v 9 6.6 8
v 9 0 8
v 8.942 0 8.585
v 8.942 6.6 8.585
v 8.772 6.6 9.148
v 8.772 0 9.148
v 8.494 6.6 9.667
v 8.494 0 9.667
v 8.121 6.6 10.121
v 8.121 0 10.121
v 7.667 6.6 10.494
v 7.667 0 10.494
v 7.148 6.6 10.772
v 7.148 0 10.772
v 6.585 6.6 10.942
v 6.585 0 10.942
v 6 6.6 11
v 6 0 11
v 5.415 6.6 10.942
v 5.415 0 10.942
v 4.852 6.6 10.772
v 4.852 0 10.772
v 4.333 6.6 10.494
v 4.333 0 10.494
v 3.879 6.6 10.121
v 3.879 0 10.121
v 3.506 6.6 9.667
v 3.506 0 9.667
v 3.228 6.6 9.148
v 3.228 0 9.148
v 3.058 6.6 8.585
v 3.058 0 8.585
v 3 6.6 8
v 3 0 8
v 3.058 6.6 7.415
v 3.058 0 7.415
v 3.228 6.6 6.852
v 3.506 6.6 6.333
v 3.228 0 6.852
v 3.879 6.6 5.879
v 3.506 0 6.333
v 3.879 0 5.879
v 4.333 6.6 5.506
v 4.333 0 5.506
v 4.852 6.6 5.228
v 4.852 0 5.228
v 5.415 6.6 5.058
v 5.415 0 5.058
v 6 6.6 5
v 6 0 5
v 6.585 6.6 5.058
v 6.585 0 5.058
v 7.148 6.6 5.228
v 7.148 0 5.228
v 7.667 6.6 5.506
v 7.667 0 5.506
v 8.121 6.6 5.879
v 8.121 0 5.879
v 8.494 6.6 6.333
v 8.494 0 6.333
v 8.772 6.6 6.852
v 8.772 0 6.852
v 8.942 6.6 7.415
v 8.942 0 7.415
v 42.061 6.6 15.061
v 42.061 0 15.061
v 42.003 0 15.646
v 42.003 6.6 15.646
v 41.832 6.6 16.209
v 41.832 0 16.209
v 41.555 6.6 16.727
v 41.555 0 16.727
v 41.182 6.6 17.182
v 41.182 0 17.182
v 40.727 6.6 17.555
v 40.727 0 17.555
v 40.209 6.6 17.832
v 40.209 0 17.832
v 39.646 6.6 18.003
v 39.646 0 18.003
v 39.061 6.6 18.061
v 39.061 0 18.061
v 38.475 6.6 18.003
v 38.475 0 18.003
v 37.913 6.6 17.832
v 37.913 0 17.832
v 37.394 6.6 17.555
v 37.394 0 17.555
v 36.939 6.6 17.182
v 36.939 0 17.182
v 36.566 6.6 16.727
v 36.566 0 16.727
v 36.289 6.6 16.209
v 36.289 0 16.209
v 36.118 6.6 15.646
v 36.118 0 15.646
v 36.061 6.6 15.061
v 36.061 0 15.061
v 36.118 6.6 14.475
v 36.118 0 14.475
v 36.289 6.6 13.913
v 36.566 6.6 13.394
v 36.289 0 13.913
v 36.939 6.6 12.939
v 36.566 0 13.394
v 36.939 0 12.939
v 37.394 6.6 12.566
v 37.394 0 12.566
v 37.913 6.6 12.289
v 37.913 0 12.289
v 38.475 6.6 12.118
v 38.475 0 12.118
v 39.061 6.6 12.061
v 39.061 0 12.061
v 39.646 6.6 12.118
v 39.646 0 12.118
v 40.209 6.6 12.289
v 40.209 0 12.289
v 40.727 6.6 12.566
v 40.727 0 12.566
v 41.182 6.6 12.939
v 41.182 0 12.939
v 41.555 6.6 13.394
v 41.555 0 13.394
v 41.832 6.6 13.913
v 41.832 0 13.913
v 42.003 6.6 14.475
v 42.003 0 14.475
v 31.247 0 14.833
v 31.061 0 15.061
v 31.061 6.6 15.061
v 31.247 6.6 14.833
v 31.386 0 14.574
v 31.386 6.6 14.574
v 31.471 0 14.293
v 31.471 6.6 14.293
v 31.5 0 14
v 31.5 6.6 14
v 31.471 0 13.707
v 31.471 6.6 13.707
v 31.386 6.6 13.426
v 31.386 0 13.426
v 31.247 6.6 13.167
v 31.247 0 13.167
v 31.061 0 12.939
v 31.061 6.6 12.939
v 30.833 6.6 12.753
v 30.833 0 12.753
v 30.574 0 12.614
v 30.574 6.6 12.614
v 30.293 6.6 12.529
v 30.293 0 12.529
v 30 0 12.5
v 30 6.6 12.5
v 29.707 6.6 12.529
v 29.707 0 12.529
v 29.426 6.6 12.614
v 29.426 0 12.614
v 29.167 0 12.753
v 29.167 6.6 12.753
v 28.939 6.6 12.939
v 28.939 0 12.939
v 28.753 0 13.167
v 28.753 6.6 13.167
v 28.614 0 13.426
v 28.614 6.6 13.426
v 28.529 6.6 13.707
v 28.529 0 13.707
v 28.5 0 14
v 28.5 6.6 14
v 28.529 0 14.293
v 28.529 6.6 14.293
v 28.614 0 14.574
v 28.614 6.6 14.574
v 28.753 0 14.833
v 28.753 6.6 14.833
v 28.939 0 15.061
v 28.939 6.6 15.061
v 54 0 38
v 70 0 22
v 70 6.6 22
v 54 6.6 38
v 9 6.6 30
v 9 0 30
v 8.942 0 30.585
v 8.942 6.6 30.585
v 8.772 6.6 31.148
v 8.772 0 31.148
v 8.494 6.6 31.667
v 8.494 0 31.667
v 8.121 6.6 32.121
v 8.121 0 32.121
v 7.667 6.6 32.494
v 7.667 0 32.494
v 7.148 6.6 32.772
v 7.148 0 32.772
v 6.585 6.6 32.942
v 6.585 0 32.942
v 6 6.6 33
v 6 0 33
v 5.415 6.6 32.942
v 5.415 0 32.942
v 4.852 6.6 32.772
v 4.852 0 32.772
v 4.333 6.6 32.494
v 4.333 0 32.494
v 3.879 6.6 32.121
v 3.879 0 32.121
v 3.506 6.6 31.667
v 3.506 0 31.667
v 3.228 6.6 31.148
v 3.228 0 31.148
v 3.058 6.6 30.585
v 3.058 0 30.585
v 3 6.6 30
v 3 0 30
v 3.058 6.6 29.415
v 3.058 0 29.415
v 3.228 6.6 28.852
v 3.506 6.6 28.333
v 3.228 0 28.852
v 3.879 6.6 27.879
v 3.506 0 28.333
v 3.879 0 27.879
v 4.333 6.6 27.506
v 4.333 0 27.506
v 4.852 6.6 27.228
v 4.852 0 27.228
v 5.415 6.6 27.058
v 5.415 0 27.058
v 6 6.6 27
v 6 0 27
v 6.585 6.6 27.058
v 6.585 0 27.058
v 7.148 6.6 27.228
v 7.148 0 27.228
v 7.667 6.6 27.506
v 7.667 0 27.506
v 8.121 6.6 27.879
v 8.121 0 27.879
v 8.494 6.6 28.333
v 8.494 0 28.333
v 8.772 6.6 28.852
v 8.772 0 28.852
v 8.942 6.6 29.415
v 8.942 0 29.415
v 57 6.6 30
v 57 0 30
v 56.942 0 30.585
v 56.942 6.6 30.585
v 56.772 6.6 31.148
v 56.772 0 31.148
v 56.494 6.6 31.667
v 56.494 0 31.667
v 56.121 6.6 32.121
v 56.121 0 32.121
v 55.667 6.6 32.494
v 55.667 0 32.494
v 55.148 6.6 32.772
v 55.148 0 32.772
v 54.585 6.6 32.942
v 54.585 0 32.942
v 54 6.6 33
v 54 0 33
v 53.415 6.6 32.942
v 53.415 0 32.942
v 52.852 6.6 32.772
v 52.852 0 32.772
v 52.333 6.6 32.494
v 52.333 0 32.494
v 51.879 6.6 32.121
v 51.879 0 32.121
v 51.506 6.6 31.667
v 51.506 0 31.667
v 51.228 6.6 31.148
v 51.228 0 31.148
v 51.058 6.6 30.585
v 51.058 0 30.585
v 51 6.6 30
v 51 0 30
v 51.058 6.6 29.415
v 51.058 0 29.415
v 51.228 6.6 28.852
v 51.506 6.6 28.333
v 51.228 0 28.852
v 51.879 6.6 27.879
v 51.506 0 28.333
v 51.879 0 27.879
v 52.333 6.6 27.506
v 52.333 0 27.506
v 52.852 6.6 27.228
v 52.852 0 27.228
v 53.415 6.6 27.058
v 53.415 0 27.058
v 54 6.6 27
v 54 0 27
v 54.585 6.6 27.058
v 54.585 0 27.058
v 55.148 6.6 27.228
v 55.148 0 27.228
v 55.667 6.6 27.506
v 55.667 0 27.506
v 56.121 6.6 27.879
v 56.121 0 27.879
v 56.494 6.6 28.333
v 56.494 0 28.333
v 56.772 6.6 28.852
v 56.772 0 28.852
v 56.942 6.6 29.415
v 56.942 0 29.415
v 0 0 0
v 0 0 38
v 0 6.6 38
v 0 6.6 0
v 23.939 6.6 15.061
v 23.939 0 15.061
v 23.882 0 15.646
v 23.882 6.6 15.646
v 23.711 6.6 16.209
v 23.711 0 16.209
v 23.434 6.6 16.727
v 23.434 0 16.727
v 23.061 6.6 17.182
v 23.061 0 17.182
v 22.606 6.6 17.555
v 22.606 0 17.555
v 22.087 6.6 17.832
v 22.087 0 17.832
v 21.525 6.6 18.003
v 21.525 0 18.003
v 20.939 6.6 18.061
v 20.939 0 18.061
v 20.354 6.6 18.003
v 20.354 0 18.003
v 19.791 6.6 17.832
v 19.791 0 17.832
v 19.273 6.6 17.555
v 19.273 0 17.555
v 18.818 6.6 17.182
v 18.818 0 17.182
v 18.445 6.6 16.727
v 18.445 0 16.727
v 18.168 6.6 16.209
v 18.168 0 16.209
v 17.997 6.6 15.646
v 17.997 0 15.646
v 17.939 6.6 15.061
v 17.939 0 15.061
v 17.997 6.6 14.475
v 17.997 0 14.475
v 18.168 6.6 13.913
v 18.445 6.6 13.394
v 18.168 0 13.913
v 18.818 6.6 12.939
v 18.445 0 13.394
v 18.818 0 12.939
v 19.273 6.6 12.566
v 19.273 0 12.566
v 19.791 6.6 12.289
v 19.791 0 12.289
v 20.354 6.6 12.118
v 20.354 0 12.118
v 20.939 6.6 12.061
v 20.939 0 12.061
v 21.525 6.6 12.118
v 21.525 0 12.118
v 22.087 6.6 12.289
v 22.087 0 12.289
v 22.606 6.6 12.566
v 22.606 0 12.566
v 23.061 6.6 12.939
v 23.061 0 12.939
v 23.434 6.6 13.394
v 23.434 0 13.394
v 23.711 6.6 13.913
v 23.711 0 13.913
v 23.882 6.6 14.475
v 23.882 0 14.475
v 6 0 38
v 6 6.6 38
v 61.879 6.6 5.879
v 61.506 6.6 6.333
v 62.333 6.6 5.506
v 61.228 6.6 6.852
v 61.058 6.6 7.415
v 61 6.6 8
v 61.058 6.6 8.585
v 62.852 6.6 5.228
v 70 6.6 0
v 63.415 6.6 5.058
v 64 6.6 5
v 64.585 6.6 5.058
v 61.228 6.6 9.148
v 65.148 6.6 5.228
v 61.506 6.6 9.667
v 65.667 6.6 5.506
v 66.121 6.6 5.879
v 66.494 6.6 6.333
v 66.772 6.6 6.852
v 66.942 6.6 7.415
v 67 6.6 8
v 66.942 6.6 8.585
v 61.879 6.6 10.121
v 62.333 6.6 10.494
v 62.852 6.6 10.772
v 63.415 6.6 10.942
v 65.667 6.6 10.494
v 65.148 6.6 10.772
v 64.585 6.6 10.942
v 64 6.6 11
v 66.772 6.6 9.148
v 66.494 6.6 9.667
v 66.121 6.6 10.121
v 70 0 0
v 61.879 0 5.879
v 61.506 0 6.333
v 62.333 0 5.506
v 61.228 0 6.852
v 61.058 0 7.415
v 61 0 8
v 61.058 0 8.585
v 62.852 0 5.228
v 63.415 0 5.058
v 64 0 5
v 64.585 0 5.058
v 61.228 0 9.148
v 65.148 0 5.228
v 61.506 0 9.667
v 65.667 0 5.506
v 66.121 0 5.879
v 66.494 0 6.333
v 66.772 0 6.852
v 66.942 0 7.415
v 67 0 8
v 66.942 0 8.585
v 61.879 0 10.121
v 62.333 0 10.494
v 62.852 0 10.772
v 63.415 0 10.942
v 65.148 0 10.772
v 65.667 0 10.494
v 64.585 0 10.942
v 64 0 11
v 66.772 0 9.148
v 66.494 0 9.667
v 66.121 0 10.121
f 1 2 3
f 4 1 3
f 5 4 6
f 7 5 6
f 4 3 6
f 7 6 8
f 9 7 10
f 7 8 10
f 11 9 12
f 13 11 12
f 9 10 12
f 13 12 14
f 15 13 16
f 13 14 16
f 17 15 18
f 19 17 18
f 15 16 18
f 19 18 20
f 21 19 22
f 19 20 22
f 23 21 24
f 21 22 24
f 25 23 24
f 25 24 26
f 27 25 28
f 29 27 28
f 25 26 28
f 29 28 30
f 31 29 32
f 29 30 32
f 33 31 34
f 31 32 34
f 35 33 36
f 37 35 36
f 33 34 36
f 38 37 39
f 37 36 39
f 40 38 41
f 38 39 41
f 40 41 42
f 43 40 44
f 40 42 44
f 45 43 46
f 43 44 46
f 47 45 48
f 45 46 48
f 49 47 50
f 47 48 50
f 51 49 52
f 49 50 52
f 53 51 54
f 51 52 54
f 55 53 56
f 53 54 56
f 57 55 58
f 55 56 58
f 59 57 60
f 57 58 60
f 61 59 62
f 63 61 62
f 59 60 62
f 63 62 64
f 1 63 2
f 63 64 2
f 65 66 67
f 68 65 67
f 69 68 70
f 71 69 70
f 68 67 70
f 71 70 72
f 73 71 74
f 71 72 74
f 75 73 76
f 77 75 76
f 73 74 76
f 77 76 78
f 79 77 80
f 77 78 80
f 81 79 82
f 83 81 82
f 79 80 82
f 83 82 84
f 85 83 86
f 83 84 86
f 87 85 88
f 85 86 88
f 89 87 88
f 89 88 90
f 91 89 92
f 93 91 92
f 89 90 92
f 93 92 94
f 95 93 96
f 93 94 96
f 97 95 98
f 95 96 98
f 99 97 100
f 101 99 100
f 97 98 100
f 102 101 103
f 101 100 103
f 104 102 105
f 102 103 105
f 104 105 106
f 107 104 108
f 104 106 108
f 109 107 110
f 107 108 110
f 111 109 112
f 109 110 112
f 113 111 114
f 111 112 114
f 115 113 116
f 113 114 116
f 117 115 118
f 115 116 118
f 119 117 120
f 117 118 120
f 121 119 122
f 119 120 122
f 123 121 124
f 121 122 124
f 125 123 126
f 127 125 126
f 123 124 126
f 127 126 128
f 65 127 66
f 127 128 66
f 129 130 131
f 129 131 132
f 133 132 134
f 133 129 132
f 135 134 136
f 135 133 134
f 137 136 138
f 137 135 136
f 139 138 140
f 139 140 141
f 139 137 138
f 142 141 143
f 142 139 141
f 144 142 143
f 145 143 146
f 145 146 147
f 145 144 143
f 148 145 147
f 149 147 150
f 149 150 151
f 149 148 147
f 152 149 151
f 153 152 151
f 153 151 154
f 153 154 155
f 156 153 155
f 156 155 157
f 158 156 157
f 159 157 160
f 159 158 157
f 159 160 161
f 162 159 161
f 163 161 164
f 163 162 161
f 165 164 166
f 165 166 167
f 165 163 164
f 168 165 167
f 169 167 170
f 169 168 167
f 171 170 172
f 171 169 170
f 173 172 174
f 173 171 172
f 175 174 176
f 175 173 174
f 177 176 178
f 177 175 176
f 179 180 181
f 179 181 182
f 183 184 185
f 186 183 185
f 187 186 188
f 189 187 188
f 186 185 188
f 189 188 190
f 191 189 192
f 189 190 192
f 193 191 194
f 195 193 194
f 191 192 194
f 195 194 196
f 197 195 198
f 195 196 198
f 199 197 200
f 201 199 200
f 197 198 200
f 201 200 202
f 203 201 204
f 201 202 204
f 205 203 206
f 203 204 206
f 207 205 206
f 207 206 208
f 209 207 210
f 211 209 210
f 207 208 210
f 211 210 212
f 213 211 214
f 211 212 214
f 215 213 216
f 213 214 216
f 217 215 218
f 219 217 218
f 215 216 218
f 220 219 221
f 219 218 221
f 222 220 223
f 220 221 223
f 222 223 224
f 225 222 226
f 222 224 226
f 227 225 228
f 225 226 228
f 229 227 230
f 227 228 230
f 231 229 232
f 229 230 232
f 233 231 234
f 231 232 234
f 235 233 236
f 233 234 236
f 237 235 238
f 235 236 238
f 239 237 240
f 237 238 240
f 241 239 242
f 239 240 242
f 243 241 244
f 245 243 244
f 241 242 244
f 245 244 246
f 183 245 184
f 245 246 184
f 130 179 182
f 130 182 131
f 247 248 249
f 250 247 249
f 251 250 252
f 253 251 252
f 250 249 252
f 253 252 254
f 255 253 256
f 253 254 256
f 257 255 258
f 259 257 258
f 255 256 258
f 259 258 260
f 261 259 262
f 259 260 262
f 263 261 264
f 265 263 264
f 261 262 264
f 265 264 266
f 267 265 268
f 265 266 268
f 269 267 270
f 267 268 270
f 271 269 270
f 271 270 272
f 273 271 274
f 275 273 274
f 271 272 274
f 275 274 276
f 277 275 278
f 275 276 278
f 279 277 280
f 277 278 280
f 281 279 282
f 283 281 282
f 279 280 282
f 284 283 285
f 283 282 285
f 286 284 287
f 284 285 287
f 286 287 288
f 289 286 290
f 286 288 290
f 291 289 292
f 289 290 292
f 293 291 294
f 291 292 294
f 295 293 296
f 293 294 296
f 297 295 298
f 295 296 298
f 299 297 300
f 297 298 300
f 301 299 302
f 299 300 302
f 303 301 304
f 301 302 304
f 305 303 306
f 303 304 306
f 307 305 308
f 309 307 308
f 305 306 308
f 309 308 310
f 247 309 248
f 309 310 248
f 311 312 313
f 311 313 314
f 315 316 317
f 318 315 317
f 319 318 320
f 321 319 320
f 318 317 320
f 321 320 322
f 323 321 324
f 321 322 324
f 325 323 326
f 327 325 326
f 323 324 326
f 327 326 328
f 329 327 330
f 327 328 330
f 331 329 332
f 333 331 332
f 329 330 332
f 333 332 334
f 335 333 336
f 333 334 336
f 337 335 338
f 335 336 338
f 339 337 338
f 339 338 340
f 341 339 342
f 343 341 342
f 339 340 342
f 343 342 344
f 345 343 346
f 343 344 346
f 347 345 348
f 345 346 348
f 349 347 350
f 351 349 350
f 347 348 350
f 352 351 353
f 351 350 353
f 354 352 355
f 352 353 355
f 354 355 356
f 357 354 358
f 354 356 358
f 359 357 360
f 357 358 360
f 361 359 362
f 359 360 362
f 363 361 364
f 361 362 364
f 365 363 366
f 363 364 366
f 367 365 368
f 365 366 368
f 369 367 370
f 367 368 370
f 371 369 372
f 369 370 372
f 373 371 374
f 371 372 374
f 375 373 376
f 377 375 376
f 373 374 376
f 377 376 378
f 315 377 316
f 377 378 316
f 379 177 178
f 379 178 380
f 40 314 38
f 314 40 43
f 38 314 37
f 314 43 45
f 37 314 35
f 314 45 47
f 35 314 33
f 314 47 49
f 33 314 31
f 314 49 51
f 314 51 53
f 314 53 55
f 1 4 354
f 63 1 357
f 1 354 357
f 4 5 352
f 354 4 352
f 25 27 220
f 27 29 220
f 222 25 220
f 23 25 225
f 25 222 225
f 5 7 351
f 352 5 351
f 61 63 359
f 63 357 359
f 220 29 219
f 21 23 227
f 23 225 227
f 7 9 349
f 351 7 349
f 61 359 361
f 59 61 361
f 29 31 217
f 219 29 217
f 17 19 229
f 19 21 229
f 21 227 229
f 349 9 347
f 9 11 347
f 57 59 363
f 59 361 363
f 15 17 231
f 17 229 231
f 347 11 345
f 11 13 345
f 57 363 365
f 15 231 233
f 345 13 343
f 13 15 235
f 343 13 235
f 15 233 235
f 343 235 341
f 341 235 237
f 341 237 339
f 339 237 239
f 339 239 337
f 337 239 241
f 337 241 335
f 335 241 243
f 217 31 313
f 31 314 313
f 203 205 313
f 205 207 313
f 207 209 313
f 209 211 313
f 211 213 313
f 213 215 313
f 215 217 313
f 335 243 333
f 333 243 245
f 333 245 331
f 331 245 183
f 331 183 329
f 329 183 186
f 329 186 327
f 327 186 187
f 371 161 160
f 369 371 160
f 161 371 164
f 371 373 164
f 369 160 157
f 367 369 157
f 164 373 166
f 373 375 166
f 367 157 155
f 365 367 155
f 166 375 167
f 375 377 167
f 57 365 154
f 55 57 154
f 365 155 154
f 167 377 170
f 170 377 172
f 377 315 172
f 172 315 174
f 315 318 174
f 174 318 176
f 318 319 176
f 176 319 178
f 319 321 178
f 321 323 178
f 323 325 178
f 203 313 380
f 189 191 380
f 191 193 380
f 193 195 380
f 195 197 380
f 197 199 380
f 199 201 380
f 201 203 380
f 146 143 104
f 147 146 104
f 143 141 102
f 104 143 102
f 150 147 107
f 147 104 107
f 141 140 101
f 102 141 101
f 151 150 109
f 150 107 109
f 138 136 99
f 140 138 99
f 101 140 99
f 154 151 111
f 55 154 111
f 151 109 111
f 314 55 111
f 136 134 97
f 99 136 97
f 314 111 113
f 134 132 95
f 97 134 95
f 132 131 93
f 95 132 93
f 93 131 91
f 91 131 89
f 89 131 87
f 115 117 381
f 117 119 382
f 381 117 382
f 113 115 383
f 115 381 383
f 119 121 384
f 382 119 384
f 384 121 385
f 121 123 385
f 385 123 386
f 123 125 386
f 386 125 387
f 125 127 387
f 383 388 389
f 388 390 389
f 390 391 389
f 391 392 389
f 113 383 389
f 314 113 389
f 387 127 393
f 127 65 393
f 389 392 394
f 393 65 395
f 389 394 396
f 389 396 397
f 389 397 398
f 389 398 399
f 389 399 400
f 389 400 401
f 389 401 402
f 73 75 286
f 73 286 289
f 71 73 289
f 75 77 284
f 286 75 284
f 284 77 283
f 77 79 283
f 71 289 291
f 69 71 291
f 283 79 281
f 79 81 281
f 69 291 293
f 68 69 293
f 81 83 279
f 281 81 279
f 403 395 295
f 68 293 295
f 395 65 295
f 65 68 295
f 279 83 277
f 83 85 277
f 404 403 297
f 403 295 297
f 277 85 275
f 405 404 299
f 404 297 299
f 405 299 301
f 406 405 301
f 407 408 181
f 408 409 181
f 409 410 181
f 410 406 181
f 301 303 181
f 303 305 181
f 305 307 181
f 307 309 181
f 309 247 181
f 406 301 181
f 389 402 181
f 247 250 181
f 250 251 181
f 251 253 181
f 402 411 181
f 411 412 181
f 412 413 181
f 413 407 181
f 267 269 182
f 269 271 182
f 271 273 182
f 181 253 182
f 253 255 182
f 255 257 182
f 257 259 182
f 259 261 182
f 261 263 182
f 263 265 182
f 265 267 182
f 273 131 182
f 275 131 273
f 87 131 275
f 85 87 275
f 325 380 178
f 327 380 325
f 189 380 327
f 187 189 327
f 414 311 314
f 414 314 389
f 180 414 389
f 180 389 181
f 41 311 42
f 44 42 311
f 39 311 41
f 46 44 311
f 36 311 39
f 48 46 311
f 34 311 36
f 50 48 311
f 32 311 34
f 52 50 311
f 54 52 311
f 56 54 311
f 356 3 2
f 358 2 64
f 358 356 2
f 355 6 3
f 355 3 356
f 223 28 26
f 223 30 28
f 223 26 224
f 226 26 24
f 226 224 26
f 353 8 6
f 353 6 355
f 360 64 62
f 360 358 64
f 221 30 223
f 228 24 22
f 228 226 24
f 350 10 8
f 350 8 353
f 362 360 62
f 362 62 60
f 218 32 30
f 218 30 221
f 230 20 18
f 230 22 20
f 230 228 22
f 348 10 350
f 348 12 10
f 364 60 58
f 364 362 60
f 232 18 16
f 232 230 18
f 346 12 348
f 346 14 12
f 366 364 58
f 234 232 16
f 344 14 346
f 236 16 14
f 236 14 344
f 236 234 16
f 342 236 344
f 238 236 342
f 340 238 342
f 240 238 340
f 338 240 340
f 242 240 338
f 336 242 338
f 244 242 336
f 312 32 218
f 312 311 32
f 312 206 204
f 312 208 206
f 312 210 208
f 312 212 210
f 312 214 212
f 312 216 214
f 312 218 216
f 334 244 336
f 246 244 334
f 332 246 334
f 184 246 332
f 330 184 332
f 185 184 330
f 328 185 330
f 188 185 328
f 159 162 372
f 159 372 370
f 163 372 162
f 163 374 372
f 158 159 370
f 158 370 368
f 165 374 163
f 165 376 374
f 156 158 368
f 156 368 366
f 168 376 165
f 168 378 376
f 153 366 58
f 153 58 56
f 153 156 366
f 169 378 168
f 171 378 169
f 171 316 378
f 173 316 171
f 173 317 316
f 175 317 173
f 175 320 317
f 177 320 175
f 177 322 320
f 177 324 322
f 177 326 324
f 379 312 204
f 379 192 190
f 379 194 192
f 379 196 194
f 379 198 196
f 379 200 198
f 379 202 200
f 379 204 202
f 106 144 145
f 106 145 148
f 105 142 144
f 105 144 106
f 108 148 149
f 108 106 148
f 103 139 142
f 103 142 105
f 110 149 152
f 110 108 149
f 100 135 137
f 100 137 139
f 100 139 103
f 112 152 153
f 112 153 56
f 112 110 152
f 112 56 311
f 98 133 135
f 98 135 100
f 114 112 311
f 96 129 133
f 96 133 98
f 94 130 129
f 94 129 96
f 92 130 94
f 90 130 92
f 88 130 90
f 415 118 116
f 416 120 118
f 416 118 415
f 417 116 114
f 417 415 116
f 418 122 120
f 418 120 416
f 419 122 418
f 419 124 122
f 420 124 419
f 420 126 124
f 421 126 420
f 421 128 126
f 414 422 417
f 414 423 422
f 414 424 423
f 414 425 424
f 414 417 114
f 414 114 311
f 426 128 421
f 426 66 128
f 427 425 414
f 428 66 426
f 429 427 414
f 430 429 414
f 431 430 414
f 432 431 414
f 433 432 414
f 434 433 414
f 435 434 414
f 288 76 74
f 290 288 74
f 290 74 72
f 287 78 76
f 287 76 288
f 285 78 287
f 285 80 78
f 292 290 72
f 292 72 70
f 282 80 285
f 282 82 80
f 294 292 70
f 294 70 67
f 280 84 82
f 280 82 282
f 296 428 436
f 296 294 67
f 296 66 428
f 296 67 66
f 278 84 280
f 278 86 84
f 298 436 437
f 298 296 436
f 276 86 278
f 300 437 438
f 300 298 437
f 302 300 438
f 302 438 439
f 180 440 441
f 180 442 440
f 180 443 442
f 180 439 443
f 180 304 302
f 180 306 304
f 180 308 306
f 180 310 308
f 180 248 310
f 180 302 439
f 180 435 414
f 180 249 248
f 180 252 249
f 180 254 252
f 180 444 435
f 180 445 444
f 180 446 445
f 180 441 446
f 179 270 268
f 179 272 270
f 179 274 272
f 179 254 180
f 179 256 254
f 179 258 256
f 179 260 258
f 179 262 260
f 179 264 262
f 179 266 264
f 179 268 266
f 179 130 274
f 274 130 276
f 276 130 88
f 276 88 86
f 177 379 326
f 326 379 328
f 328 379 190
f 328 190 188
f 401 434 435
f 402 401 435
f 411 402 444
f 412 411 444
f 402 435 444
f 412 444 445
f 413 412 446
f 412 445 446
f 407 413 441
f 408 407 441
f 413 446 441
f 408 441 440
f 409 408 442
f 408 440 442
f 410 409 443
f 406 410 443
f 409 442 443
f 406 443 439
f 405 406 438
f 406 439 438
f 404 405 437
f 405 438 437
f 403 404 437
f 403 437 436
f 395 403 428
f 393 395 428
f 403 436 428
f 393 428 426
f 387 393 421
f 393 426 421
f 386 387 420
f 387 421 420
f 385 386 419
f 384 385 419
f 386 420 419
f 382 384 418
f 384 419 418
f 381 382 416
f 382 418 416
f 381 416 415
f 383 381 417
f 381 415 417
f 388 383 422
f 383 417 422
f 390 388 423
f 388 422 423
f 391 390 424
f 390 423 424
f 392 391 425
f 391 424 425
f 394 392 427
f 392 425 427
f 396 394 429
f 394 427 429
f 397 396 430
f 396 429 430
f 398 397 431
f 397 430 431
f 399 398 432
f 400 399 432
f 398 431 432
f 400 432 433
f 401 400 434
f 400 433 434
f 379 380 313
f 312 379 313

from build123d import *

# Parameters (mm, degrees)
F0_R     = 3
F1_DEPTH = 6.6


with BuildPart() as f1:
    # F0 (on Front) → F1 (new body)
    with BuildSketch(Plane.XZ):
        with BuildLine():
            Line((0, 38), (0, 0))
            Line((0, 0), (70, 0))
            Line((70, 0), (70, 21.999999))
            Line((70, 21.999999), (54, 38))
            Line((54, 38), (31.060658, 15.06066))
            ThreePointArc((31.060658, 15.06066), (29.999998, 12.5), (28.939338, 15.06066))
            Line((28.939338, 15.06066), (6, 38))
            Line((6, 38), (0, 38))
        make_face()
        with Locations((6, 8)):
            Circle(F0_R, mode=Mode.SUBTRACT)
        with Locations((20.939338, 15.060661)):
            Circle(F0_R, mode=Mode.SUBTRACT)
        with Locations((64, 8)):
            Circle(F0_R, mode=Mode.SUBTRACT)
        with Locations((39.060658, 15.060661)):
            Circle(F0_R, mode=Mode.SUBTRACT)
        with Locations((6, 30)):
            Circle(F0_R, mode=Mode.SUBTRACT)
        with Locations((53.999996, 30)):
            Circle(F0_R, mode=Mode.SUBTRACT)
    extrude(amount=-F1_DEPTH)


solid = f1.part
